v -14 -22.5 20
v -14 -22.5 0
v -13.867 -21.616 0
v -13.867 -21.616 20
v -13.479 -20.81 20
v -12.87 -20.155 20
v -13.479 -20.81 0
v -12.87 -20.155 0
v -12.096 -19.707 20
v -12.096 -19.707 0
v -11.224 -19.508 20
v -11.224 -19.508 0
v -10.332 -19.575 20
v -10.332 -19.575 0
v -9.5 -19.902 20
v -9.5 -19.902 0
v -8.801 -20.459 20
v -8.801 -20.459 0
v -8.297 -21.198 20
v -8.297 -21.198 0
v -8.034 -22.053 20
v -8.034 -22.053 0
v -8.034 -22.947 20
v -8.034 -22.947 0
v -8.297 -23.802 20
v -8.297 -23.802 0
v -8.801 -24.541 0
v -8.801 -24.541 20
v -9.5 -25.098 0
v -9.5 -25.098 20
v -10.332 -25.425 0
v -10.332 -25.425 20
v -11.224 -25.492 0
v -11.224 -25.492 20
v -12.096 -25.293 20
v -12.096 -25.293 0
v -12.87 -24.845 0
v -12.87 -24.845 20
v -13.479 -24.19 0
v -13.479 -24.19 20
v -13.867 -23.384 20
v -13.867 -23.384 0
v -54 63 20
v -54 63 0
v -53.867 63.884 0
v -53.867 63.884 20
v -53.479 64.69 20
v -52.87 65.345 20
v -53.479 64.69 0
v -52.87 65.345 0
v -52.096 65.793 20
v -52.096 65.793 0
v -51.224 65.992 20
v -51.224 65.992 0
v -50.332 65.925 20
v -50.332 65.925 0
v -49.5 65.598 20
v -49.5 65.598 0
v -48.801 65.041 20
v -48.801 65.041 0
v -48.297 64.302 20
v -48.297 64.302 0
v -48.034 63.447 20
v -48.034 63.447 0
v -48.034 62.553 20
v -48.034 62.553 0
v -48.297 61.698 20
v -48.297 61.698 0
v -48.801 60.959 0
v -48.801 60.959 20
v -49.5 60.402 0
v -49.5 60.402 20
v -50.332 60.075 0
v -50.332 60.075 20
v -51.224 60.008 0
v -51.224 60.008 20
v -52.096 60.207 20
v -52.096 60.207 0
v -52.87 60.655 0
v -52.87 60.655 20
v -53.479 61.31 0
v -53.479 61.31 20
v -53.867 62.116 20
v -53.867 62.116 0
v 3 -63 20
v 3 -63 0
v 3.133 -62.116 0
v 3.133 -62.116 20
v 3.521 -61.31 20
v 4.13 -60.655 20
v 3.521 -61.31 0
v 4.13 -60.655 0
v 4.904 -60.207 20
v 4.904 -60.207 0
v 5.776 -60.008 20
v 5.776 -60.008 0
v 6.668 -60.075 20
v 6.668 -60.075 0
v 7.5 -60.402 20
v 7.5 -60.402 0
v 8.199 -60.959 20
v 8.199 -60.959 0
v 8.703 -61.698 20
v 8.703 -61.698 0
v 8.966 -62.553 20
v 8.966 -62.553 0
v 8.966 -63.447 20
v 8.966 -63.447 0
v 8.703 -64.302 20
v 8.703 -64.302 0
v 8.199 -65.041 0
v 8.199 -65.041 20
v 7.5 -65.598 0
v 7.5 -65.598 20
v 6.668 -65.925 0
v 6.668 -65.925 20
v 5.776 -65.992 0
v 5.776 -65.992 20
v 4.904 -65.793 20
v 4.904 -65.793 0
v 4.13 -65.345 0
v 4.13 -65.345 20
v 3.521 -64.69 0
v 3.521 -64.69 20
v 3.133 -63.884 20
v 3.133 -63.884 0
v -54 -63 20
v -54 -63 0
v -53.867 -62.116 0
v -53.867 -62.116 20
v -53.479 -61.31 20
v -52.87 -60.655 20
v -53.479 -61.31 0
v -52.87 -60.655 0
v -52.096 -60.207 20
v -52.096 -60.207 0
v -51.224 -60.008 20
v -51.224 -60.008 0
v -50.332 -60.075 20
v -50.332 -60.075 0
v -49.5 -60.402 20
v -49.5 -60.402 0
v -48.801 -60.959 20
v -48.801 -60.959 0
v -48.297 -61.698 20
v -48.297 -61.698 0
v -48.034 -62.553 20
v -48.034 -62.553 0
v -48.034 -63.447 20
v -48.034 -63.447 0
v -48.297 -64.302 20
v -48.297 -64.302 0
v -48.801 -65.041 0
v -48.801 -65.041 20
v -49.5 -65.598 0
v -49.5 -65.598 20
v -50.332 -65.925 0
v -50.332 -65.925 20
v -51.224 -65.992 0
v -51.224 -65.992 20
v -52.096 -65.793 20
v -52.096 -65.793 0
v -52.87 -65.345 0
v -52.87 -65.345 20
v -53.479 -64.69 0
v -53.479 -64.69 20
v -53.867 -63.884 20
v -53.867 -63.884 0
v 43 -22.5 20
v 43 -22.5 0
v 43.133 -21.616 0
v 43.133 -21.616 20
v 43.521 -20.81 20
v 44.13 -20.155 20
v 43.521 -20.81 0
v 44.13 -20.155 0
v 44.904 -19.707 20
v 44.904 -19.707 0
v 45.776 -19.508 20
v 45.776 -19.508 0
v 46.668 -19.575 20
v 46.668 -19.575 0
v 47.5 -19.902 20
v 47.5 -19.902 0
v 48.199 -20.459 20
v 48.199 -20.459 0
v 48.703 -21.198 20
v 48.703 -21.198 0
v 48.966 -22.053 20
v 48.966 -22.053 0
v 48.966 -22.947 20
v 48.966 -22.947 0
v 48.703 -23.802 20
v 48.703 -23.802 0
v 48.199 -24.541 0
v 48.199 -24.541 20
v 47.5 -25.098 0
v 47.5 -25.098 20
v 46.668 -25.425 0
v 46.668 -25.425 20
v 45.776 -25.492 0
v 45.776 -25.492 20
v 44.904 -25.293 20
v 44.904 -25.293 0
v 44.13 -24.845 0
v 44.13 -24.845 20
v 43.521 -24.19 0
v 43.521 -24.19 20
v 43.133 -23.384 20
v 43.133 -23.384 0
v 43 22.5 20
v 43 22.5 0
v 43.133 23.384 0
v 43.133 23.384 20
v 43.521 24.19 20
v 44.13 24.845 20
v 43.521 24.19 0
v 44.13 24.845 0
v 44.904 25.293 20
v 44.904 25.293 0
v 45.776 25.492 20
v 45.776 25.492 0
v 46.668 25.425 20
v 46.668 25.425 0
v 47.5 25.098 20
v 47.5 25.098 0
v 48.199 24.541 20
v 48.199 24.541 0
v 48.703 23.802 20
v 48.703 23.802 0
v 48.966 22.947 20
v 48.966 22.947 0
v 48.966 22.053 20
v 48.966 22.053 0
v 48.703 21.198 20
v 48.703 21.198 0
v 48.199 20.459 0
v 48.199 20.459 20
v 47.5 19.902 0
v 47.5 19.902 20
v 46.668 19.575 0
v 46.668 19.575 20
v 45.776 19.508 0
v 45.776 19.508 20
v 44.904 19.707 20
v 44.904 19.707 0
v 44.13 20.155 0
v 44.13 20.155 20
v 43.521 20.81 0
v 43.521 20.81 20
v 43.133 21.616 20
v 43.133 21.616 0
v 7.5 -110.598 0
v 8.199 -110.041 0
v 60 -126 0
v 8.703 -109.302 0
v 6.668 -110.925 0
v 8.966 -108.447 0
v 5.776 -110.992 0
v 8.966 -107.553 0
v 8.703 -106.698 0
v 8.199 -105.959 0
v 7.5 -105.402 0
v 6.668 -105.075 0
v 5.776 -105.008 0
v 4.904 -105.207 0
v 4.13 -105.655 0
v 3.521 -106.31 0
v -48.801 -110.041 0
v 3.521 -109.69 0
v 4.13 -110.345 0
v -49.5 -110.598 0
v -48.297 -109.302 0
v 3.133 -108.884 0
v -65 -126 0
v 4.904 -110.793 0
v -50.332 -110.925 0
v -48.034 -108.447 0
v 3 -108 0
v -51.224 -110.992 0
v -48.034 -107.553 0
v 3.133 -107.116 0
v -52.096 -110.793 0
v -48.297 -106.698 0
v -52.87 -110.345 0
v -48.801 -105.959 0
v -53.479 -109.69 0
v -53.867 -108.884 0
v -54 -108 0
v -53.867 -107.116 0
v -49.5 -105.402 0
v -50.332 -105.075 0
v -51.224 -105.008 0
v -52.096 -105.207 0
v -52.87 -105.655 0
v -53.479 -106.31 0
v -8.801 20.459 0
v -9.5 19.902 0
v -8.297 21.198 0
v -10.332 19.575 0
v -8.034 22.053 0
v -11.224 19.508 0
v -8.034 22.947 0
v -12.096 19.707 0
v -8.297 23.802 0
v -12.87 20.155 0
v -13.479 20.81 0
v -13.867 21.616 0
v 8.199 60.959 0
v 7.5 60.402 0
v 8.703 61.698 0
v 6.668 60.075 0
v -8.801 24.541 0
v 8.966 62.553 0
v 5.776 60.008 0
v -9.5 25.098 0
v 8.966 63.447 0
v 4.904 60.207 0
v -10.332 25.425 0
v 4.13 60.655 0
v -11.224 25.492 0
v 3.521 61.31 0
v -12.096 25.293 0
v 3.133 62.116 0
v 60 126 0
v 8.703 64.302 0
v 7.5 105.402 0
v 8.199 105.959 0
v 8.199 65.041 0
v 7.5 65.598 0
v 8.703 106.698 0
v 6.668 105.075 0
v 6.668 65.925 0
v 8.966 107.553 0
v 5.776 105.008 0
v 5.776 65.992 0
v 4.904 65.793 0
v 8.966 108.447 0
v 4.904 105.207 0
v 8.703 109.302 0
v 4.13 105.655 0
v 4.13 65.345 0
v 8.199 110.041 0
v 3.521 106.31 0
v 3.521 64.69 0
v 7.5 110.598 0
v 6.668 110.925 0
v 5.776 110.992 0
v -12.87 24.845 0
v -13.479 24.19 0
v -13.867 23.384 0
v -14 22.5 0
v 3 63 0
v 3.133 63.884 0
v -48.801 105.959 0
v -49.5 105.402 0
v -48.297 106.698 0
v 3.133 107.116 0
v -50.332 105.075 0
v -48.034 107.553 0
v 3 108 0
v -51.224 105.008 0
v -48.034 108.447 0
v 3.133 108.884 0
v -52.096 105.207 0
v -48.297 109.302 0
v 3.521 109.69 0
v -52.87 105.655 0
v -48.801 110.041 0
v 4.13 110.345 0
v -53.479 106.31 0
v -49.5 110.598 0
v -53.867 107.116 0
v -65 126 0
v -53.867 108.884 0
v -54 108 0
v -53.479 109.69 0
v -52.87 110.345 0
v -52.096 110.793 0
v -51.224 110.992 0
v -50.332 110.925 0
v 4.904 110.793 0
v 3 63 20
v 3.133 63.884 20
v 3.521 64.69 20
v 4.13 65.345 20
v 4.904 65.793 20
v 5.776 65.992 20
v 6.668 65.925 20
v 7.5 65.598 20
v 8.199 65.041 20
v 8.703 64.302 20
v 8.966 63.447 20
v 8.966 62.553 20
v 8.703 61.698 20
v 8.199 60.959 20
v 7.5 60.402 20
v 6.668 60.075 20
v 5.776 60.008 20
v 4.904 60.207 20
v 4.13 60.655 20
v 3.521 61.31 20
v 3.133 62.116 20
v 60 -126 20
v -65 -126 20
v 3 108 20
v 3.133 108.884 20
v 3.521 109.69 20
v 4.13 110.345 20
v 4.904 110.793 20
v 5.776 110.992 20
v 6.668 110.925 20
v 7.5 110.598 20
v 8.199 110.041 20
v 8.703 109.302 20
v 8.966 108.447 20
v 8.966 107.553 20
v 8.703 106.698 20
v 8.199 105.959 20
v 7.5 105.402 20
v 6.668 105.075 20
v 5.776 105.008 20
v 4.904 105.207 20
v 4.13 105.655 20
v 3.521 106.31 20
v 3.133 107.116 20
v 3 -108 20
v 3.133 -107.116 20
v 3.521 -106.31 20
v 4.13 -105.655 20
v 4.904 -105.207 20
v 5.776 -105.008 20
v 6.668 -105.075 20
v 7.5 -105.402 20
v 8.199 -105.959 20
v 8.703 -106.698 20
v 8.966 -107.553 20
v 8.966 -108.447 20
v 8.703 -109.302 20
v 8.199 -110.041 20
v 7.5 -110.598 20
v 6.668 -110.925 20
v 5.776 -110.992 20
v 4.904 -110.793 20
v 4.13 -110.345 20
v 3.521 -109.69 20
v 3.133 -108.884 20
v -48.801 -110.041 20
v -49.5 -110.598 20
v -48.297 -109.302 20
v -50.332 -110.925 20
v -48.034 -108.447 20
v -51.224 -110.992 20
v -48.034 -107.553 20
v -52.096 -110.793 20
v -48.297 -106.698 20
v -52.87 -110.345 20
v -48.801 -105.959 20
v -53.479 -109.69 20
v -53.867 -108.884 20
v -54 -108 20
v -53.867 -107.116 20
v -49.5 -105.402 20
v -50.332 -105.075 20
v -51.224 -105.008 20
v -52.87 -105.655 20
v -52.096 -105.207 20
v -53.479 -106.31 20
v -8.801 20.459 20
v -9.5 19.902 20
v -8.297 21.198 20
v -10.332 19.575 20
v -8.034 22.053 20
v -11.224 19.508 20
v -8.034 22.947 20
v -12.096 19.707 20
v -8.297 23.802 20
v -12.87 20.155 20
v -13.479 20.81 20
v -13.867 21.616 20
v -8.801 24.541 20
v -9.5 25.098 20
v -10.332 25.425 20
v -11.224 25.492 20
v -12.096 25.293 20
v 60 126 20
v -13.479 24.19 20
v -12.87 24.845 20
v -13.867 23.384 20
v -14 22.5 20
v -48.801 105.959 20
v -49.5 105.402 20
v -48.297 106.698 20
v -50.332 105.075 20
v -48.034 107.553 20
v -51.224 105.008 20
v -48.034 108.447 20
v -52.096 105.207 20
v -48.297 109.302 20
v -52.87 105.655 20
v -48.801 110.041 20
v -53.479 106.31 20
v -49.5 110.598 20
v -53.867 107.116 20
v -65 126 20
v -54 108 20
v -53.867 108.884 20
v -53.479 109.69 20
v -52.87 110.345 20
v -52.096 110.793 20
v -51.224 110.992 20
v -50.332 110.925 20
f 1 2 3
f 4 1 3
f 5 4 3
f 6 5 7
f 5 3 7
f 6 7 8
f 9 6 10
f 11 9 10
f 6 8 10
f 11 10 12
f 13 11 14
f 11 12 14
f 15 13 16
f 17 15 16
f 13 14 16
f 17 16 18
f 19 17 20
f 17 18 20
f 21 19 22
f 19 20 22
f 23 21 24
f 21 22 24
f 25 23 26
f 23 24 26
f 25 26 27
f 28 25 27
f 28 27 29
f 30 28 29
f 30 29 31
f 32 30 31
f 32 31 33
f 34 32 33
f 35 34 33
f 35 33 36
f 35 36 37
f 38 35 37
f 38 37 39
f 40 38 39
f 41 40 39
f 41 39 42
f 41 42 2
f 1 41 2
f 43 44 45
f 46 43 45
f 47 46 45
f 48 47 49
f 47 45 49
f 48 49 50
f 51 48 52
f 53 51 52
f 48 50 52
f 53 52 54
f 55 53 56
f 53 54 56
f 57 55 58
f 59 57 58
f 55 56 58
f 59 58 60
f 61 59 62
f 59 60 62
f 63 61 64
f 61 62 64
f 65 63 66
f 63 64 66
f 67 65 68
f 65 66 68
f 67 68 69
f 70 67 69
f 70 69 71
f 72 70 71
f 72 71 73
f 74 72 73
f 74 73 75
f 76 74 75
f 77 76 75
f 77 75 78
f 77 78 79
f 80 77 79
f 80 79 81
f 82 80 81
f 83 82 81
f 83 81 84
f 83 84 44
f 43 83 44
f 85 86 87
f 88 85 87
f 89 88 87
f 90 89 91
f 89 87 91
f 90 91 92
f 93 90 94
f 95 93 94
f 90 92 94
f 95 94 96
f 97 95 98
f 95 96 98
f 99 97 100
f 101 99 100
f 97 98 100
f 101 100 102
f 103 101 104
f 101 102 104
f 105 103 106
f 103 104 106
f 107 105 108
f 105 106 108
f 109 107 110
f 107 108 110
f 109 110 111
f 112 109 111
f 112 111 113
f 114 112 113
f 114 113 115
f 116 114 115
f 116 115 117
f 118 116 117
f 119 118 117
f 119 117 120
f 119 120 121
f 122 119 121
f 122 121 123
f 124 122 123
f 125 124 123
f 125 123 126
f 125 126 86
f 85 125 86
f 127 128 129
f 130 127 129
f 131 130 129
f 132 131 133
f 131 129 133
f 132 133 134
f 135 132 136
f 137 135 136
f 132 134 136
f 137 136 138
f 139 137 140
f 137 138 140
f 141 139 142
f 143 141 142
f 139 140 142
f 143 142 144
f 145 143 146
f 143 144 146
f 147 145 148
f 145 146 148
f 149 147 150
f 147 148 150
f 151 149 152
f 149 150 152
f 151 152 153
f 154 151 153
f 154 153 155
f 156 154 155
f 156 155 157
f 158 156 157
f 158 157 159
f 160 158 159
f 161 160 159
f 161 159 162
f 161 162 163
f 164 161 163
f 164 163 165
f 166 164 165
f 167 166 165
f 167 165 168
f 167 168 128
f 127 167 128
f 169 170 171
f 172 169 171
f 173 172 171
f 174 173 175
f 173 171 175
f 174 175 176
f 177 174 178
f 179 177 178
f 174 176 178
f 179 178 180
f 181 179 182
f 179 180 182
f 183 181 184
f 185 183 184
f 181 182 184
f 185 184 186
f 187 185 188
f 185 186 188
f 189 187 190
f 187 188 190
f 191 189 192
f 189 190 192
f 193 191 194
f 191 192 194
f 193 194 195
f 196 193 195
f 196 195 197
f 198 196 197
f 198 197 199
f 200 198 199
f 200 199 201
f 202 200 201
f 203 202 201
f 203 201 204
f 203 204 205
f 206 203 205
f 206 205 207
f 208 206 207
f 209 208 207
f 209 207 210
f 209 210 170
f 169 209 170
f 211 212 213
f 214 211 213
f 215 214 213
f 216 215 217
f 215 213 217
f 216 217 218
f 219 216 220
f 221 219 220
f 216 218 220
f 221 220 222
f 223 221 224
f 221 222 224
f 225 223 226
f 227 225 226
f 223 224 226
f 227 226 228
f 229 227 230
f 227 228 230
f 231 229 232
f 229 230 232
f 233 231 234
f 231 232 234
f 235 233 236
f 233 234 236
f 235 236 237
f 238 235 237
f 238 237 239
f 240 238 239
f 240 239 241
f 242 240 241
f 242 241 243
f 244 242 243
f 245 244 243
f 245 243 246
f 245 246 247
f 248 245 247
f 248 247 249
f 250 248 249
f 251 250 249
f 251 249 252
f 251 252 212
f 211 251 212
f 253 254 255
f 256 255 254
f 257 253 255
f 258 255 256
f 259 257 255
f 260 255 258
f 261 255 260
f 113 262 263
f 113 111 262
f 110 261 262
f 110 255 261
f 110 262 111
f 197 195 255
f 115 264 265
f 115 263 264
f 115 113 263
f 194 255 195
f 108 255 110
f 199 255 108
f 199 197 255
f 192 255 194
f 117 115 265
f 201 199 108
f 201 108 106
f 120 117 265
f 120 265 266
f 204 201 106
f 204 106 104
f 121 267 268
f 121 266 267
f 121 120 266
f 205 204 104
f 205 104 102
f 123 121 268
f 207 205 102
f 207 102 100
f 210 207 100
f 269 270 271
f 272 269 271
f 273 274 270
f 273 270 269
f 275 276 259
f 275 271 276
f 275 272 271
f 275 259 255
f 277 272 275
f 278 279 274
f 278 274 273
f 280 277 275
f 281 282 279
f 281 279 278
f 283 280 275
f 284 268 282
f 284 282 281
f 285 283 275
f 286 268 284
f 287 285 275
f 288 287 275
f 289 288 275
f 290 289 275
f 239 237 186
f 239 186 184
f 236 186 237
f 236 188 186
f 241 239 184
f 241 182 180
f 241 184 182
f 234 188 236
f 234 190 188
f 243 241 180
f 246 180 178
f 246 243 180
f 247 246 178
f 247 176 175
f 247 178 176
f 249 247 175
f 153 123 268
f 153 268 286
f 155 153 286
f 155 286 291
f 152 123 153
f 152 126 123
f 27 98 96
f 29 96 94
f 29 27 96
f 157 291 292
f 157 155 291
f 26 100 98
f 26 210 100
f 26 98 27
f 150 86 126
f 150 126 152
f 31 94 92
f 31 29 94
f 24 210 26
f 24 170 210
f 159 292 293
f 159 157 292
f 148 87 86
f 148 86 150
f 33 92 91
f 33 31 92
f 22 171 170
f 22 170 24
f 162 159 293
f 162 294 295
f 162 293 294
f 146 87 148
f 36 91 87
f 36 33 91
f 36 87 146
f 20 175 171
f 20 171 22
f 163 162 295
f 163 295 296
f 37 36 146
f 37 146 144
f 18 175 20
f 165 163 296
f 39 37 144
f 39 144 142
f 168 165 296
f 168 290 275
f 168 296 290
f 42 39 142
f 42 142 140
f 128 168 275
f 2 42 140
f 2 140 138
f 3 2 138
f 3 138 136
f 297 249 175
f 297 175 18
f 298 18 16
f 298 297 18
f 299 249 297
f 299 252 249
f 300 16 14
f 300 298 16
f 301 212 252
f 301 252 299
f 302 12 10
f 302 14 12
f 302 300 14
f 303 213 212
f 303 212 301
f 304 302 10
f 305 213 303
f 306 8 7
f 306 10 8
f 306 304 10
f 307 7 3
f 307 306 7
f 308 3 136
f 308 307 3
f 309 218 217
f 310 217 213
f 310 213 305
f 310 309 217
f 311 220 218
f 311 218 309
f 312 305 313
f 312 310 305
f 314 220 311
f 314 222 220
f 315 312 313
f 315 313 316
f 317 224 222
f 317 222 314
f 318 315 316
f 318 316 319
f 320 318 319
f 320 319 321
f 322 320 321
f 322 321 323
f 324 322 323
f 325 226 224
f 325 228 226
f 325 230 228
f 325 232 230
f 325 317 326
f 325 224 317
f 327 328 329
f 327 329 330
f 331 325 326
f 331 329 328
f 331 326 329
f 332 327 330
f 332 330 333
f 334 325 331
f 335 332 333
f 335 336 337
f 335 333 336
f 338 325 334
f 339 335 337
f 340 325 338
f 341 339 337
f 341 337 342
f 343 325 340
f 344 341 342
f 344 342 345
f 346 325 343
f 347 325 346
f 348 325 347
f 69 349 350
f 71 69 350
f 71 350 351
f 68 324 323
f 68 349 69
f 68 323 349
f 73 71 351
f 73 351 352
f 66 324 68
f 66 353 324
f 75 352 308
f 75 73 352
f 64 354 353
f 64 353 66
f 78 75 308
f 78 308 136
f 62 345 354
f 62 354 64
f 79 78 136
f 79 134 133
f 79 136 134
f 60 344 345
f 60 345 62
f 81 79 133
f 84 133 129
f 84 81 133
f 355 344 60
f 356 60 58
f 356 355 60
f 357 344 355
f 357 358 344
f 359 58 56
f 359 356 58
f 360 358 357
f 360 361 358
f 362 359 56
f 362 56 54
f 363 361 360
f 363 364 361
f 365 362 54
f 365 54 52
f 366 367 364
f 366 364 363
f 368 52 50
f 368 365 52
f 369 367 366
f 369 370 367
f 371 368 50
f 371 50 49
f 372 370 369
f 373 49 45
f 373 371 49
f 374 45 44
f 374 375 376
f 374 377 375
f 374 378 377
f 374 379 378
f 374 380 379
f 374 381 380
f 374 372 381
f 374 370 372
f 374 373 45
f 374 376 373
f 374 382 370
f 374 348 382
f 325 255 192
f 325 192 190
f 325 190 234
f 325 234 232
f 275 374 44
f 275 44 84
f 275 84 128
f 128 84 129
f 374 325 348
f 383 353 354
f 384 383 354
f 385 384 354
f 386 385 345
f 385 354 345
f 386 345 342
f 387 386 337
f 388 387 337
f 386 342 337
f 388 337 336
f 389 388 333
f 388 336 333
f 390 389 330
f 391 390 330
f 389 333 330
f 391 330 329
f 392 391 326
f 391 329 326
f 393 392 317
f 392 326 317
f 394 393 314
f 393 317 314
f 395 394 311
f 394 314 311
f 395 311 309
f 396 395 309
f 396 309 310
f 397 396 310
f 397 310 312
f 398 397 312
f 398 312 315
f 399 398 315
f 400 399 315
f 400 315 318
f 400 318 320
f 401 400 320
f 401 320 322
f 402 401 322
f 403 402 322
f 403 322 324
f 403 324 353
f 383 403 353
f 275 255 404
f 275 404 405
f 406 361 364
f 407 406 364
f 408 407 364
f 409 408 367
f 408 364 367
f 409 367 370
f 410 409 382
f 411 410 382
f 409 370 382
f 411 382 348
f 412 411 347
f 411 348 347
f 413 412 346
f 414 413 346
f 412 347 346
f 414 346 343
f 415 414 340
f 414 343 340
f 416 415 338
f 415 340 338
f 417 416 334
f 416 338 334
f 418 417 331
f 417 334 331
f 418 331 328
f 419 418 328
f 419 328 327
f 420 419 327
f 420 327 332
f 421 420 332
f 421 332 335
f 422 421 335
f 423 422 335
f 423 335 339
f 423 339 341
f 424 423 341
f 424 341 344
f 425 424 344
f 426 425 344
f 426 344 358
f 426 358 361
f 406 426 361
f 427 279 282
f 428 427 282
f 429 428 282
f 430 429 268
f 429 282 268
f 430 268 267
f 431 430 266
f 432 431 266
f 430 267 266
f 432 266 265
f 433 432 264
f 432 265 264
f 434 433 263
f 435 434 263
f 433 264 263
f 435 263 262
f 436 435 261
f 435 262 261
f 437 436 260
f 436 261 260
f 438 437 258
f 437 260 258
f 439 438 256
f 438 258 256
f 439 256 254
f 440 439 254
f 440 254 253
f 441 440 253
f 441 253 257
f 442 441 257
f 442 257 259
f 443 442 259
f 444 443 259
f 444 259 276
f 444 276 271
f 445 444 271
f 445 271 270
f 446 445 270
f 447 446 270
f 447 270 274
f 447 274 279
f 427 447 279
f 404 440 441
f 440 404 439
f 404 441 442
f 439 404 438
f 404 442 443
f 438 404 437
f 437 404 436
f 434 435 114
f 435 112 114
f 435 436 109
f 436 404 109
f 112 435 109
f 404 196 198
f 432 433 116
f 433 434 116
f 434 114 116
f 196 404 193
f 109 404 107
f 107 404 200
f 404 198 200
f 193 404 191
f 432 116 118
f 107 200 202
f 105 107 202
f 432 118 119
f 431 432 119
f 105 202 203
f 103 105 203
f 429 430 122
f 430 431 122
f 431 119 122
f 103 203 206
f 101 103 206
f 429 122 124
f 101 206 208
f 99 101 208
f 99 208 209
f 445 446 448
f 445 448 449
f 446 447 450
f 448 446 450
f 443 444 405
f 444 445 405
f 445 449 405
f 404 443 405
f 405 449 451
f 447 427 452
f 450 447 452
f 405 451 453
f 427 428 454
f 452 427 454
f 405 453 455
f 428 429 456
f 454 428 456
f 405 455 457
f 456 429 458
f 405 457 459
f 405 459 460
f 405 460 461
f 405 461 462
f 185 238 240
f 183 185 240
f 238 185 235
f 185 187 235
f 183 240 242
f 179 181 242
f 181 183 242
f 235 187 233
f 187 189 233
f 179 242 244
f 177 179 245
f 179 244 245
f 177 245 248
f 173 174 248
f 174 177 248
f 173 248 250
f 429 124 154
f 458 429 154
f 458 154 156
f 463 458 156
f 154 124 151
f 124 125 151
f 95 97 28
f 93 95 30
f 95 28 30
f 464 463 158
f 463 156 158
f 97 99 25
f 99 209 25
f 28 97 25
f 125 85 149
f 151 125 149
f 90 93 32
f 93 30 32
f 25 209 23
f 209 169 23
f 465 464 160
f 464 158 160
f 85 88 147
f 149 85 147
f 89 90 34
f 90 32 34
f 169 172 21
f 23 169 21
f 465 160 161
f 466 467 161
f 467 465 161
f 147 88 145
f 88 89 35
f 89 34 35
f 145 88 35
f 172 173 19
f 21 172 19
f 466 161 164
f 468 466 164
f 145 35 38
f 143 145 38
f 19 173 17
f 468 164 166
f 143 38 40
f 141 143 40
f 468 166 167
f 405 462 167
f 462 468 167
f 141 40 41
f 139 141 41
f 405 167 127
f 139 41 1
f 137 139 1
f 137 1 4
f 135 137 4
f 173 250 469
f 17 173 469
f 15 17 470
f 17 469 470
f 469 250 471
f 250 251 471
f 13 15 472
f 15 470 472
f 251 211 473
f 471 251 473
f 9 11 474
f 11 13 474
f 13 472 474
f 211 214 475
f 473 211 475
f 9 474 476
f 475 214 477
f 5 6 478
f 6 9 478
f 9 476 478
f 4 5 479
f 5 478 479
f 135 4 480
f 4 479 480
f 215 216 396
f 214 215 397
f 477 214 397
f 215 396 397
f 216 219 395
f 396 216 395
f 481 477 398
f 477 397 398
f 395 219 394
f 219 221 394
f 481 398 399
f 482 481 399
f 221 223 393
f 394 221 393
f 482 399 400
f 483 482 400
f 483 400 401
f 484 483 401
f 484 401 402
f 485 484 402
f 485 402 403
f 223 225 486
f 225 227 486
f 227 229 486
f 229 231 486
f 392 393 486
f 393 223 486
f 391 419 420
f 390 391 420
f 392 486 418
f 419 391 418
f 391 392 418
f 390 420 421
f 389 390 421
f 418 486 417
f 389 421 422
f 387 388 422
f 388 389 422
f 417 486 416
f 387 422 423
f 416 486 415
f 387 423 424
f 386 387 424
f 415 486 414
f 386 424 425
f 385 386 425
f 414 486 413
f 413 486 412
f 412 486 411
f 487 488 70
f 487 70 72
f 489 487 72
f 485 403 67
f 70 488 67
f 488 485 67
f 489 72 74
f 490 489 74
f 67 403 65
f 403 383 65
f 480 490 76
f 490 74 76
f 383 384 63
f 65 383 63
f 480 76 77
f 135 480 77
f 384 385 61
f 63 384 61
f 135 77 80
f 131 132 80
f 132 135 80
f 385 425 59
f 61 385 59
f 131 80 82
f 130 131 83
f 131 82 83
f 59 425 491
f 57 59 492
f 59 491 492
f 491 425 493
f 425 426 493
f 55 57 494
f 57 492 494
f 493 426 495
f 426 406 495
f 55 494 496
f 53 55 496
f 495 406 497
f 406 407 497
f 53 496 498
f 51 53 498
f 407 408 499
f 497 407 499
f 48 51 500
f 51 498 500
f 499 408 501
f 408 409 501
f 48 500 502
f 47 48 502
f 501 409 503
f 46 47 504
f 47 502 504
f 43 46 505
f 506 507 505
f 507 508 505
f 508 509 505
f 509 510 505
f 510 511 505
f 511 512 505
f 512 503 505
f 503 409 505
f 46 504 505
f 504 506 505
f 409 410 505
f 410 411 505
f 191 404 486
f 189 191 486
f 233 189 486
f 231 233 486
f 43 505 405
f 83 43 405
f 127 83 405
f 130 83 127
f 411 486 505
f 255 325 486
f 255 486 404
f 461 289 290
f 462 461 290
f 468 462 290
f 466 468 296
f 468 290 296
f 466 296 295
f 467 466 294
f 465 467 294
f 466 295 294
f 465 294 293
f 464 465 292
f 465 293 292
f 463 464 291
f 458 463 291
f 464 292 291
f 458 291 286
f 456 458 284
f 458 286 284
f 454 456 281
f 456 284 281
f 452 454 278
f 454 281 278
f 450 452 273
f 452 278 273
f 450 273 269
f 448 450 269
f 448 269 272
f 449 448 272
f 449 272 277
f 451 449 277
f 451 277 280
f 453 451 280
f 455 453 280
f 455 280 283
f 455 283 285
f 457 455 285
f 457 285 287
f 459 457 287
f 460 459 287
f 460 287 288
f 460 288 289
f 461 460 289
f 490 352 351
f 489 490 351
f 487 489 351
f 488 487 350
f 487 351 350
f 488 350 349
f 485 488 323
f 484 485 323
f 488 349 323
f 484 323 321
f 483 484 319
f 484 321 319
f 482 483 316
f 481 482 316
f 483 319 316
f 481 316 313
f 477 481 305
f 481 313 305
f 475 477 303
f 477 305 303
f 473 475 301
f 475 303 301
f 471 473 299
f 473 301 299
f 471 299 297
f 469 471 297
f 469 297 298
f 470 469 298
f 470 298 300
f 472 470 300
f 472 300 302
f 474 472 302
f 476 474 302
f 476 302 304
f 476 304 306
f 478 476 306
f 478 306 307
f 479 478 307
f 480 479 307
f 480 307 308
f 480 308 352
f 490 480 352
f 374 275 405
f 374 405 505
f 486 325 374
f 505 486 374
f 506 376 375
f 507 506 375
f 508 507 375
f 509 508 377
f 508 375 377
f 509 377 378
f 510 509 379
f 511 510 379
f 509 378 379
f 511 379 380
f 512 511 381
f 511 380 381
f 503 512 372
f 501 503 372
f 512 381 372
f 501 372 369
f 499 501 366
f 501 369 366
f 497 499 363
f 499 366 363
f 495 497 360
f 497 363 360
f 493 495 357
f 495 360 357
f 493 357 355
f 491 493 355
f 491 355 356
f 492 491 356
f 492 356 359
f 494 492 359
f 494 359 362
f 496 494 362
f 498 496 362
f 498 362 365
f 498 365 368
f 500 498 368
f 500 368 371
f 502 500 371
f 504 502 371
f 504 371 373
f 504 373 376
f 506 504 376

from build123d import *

# Parameters (mm, degrees)
ESTRUSIONE_ESTRUSIONE1_DEPTH = 20
SCHIZZO5_R                   = 3
TAGLIO_ESTRUSIONE1_DEPTH     = 144.181702742


with BuildPart() as part:
    # Schizzo1 → Estrusione-Estrusione1 (new body)
    with BuildSketch(Plane.XY):
        Polygon((60, 126), (60, -126), (-65, -126), (-65, 126), (-60, 126), align=None)
    extrude(amount=ESTRUSIONE_ESTRUSIONE1_DEPTH)

    # Schizzo5 → Taglio-Estrusione1 (cut, through all)
    with BuildSketch(Plane(origin=(0, 0, 0), x_dir=(-1, 0, 0), z_dir=(0, 0, -1))):
        with Locations((51, 108)):
            Circle(SCHIZZO5_R)
        with Locations((51, 63)):
            Circle(SCHIZZO5_R)
        with Locations((-6, 108)):
            Circle(SCHIZZO5_R)
        with Locations((-6, 63)):
            Circle(SCHIZZO5_R)
        with Locations((11.000000001, 22.499999999)):
            Circle(SCHIZZO5_R)
        with Locations((11.000000001, -22.500000001)):
            Circle(SCHIZZO5_R)
        with Locations((-45.999999999, 22.499999999)):
            Circle(SCHIZZO5_R)
        with Locations((-45.999999999, -22.500000001)):
            Circle(SCHIZZO5_R)
        with Locations((-6, -63)):
            Circle(SCHIZZO5_R)
        with Locations((-6, -108)):
            Circle(SCHIZZO5_R)
        with Locations((51, -63)):
            Circle(SCHIZZO5_R)
        with Locations((51, -108)):
            Circle(SCHIZZO5_R)
    extrude(amount=-TAGLIO_ESTRUSIONE1_DEPTH, mode=Mode.SUBTRACT)


solid = part.part
